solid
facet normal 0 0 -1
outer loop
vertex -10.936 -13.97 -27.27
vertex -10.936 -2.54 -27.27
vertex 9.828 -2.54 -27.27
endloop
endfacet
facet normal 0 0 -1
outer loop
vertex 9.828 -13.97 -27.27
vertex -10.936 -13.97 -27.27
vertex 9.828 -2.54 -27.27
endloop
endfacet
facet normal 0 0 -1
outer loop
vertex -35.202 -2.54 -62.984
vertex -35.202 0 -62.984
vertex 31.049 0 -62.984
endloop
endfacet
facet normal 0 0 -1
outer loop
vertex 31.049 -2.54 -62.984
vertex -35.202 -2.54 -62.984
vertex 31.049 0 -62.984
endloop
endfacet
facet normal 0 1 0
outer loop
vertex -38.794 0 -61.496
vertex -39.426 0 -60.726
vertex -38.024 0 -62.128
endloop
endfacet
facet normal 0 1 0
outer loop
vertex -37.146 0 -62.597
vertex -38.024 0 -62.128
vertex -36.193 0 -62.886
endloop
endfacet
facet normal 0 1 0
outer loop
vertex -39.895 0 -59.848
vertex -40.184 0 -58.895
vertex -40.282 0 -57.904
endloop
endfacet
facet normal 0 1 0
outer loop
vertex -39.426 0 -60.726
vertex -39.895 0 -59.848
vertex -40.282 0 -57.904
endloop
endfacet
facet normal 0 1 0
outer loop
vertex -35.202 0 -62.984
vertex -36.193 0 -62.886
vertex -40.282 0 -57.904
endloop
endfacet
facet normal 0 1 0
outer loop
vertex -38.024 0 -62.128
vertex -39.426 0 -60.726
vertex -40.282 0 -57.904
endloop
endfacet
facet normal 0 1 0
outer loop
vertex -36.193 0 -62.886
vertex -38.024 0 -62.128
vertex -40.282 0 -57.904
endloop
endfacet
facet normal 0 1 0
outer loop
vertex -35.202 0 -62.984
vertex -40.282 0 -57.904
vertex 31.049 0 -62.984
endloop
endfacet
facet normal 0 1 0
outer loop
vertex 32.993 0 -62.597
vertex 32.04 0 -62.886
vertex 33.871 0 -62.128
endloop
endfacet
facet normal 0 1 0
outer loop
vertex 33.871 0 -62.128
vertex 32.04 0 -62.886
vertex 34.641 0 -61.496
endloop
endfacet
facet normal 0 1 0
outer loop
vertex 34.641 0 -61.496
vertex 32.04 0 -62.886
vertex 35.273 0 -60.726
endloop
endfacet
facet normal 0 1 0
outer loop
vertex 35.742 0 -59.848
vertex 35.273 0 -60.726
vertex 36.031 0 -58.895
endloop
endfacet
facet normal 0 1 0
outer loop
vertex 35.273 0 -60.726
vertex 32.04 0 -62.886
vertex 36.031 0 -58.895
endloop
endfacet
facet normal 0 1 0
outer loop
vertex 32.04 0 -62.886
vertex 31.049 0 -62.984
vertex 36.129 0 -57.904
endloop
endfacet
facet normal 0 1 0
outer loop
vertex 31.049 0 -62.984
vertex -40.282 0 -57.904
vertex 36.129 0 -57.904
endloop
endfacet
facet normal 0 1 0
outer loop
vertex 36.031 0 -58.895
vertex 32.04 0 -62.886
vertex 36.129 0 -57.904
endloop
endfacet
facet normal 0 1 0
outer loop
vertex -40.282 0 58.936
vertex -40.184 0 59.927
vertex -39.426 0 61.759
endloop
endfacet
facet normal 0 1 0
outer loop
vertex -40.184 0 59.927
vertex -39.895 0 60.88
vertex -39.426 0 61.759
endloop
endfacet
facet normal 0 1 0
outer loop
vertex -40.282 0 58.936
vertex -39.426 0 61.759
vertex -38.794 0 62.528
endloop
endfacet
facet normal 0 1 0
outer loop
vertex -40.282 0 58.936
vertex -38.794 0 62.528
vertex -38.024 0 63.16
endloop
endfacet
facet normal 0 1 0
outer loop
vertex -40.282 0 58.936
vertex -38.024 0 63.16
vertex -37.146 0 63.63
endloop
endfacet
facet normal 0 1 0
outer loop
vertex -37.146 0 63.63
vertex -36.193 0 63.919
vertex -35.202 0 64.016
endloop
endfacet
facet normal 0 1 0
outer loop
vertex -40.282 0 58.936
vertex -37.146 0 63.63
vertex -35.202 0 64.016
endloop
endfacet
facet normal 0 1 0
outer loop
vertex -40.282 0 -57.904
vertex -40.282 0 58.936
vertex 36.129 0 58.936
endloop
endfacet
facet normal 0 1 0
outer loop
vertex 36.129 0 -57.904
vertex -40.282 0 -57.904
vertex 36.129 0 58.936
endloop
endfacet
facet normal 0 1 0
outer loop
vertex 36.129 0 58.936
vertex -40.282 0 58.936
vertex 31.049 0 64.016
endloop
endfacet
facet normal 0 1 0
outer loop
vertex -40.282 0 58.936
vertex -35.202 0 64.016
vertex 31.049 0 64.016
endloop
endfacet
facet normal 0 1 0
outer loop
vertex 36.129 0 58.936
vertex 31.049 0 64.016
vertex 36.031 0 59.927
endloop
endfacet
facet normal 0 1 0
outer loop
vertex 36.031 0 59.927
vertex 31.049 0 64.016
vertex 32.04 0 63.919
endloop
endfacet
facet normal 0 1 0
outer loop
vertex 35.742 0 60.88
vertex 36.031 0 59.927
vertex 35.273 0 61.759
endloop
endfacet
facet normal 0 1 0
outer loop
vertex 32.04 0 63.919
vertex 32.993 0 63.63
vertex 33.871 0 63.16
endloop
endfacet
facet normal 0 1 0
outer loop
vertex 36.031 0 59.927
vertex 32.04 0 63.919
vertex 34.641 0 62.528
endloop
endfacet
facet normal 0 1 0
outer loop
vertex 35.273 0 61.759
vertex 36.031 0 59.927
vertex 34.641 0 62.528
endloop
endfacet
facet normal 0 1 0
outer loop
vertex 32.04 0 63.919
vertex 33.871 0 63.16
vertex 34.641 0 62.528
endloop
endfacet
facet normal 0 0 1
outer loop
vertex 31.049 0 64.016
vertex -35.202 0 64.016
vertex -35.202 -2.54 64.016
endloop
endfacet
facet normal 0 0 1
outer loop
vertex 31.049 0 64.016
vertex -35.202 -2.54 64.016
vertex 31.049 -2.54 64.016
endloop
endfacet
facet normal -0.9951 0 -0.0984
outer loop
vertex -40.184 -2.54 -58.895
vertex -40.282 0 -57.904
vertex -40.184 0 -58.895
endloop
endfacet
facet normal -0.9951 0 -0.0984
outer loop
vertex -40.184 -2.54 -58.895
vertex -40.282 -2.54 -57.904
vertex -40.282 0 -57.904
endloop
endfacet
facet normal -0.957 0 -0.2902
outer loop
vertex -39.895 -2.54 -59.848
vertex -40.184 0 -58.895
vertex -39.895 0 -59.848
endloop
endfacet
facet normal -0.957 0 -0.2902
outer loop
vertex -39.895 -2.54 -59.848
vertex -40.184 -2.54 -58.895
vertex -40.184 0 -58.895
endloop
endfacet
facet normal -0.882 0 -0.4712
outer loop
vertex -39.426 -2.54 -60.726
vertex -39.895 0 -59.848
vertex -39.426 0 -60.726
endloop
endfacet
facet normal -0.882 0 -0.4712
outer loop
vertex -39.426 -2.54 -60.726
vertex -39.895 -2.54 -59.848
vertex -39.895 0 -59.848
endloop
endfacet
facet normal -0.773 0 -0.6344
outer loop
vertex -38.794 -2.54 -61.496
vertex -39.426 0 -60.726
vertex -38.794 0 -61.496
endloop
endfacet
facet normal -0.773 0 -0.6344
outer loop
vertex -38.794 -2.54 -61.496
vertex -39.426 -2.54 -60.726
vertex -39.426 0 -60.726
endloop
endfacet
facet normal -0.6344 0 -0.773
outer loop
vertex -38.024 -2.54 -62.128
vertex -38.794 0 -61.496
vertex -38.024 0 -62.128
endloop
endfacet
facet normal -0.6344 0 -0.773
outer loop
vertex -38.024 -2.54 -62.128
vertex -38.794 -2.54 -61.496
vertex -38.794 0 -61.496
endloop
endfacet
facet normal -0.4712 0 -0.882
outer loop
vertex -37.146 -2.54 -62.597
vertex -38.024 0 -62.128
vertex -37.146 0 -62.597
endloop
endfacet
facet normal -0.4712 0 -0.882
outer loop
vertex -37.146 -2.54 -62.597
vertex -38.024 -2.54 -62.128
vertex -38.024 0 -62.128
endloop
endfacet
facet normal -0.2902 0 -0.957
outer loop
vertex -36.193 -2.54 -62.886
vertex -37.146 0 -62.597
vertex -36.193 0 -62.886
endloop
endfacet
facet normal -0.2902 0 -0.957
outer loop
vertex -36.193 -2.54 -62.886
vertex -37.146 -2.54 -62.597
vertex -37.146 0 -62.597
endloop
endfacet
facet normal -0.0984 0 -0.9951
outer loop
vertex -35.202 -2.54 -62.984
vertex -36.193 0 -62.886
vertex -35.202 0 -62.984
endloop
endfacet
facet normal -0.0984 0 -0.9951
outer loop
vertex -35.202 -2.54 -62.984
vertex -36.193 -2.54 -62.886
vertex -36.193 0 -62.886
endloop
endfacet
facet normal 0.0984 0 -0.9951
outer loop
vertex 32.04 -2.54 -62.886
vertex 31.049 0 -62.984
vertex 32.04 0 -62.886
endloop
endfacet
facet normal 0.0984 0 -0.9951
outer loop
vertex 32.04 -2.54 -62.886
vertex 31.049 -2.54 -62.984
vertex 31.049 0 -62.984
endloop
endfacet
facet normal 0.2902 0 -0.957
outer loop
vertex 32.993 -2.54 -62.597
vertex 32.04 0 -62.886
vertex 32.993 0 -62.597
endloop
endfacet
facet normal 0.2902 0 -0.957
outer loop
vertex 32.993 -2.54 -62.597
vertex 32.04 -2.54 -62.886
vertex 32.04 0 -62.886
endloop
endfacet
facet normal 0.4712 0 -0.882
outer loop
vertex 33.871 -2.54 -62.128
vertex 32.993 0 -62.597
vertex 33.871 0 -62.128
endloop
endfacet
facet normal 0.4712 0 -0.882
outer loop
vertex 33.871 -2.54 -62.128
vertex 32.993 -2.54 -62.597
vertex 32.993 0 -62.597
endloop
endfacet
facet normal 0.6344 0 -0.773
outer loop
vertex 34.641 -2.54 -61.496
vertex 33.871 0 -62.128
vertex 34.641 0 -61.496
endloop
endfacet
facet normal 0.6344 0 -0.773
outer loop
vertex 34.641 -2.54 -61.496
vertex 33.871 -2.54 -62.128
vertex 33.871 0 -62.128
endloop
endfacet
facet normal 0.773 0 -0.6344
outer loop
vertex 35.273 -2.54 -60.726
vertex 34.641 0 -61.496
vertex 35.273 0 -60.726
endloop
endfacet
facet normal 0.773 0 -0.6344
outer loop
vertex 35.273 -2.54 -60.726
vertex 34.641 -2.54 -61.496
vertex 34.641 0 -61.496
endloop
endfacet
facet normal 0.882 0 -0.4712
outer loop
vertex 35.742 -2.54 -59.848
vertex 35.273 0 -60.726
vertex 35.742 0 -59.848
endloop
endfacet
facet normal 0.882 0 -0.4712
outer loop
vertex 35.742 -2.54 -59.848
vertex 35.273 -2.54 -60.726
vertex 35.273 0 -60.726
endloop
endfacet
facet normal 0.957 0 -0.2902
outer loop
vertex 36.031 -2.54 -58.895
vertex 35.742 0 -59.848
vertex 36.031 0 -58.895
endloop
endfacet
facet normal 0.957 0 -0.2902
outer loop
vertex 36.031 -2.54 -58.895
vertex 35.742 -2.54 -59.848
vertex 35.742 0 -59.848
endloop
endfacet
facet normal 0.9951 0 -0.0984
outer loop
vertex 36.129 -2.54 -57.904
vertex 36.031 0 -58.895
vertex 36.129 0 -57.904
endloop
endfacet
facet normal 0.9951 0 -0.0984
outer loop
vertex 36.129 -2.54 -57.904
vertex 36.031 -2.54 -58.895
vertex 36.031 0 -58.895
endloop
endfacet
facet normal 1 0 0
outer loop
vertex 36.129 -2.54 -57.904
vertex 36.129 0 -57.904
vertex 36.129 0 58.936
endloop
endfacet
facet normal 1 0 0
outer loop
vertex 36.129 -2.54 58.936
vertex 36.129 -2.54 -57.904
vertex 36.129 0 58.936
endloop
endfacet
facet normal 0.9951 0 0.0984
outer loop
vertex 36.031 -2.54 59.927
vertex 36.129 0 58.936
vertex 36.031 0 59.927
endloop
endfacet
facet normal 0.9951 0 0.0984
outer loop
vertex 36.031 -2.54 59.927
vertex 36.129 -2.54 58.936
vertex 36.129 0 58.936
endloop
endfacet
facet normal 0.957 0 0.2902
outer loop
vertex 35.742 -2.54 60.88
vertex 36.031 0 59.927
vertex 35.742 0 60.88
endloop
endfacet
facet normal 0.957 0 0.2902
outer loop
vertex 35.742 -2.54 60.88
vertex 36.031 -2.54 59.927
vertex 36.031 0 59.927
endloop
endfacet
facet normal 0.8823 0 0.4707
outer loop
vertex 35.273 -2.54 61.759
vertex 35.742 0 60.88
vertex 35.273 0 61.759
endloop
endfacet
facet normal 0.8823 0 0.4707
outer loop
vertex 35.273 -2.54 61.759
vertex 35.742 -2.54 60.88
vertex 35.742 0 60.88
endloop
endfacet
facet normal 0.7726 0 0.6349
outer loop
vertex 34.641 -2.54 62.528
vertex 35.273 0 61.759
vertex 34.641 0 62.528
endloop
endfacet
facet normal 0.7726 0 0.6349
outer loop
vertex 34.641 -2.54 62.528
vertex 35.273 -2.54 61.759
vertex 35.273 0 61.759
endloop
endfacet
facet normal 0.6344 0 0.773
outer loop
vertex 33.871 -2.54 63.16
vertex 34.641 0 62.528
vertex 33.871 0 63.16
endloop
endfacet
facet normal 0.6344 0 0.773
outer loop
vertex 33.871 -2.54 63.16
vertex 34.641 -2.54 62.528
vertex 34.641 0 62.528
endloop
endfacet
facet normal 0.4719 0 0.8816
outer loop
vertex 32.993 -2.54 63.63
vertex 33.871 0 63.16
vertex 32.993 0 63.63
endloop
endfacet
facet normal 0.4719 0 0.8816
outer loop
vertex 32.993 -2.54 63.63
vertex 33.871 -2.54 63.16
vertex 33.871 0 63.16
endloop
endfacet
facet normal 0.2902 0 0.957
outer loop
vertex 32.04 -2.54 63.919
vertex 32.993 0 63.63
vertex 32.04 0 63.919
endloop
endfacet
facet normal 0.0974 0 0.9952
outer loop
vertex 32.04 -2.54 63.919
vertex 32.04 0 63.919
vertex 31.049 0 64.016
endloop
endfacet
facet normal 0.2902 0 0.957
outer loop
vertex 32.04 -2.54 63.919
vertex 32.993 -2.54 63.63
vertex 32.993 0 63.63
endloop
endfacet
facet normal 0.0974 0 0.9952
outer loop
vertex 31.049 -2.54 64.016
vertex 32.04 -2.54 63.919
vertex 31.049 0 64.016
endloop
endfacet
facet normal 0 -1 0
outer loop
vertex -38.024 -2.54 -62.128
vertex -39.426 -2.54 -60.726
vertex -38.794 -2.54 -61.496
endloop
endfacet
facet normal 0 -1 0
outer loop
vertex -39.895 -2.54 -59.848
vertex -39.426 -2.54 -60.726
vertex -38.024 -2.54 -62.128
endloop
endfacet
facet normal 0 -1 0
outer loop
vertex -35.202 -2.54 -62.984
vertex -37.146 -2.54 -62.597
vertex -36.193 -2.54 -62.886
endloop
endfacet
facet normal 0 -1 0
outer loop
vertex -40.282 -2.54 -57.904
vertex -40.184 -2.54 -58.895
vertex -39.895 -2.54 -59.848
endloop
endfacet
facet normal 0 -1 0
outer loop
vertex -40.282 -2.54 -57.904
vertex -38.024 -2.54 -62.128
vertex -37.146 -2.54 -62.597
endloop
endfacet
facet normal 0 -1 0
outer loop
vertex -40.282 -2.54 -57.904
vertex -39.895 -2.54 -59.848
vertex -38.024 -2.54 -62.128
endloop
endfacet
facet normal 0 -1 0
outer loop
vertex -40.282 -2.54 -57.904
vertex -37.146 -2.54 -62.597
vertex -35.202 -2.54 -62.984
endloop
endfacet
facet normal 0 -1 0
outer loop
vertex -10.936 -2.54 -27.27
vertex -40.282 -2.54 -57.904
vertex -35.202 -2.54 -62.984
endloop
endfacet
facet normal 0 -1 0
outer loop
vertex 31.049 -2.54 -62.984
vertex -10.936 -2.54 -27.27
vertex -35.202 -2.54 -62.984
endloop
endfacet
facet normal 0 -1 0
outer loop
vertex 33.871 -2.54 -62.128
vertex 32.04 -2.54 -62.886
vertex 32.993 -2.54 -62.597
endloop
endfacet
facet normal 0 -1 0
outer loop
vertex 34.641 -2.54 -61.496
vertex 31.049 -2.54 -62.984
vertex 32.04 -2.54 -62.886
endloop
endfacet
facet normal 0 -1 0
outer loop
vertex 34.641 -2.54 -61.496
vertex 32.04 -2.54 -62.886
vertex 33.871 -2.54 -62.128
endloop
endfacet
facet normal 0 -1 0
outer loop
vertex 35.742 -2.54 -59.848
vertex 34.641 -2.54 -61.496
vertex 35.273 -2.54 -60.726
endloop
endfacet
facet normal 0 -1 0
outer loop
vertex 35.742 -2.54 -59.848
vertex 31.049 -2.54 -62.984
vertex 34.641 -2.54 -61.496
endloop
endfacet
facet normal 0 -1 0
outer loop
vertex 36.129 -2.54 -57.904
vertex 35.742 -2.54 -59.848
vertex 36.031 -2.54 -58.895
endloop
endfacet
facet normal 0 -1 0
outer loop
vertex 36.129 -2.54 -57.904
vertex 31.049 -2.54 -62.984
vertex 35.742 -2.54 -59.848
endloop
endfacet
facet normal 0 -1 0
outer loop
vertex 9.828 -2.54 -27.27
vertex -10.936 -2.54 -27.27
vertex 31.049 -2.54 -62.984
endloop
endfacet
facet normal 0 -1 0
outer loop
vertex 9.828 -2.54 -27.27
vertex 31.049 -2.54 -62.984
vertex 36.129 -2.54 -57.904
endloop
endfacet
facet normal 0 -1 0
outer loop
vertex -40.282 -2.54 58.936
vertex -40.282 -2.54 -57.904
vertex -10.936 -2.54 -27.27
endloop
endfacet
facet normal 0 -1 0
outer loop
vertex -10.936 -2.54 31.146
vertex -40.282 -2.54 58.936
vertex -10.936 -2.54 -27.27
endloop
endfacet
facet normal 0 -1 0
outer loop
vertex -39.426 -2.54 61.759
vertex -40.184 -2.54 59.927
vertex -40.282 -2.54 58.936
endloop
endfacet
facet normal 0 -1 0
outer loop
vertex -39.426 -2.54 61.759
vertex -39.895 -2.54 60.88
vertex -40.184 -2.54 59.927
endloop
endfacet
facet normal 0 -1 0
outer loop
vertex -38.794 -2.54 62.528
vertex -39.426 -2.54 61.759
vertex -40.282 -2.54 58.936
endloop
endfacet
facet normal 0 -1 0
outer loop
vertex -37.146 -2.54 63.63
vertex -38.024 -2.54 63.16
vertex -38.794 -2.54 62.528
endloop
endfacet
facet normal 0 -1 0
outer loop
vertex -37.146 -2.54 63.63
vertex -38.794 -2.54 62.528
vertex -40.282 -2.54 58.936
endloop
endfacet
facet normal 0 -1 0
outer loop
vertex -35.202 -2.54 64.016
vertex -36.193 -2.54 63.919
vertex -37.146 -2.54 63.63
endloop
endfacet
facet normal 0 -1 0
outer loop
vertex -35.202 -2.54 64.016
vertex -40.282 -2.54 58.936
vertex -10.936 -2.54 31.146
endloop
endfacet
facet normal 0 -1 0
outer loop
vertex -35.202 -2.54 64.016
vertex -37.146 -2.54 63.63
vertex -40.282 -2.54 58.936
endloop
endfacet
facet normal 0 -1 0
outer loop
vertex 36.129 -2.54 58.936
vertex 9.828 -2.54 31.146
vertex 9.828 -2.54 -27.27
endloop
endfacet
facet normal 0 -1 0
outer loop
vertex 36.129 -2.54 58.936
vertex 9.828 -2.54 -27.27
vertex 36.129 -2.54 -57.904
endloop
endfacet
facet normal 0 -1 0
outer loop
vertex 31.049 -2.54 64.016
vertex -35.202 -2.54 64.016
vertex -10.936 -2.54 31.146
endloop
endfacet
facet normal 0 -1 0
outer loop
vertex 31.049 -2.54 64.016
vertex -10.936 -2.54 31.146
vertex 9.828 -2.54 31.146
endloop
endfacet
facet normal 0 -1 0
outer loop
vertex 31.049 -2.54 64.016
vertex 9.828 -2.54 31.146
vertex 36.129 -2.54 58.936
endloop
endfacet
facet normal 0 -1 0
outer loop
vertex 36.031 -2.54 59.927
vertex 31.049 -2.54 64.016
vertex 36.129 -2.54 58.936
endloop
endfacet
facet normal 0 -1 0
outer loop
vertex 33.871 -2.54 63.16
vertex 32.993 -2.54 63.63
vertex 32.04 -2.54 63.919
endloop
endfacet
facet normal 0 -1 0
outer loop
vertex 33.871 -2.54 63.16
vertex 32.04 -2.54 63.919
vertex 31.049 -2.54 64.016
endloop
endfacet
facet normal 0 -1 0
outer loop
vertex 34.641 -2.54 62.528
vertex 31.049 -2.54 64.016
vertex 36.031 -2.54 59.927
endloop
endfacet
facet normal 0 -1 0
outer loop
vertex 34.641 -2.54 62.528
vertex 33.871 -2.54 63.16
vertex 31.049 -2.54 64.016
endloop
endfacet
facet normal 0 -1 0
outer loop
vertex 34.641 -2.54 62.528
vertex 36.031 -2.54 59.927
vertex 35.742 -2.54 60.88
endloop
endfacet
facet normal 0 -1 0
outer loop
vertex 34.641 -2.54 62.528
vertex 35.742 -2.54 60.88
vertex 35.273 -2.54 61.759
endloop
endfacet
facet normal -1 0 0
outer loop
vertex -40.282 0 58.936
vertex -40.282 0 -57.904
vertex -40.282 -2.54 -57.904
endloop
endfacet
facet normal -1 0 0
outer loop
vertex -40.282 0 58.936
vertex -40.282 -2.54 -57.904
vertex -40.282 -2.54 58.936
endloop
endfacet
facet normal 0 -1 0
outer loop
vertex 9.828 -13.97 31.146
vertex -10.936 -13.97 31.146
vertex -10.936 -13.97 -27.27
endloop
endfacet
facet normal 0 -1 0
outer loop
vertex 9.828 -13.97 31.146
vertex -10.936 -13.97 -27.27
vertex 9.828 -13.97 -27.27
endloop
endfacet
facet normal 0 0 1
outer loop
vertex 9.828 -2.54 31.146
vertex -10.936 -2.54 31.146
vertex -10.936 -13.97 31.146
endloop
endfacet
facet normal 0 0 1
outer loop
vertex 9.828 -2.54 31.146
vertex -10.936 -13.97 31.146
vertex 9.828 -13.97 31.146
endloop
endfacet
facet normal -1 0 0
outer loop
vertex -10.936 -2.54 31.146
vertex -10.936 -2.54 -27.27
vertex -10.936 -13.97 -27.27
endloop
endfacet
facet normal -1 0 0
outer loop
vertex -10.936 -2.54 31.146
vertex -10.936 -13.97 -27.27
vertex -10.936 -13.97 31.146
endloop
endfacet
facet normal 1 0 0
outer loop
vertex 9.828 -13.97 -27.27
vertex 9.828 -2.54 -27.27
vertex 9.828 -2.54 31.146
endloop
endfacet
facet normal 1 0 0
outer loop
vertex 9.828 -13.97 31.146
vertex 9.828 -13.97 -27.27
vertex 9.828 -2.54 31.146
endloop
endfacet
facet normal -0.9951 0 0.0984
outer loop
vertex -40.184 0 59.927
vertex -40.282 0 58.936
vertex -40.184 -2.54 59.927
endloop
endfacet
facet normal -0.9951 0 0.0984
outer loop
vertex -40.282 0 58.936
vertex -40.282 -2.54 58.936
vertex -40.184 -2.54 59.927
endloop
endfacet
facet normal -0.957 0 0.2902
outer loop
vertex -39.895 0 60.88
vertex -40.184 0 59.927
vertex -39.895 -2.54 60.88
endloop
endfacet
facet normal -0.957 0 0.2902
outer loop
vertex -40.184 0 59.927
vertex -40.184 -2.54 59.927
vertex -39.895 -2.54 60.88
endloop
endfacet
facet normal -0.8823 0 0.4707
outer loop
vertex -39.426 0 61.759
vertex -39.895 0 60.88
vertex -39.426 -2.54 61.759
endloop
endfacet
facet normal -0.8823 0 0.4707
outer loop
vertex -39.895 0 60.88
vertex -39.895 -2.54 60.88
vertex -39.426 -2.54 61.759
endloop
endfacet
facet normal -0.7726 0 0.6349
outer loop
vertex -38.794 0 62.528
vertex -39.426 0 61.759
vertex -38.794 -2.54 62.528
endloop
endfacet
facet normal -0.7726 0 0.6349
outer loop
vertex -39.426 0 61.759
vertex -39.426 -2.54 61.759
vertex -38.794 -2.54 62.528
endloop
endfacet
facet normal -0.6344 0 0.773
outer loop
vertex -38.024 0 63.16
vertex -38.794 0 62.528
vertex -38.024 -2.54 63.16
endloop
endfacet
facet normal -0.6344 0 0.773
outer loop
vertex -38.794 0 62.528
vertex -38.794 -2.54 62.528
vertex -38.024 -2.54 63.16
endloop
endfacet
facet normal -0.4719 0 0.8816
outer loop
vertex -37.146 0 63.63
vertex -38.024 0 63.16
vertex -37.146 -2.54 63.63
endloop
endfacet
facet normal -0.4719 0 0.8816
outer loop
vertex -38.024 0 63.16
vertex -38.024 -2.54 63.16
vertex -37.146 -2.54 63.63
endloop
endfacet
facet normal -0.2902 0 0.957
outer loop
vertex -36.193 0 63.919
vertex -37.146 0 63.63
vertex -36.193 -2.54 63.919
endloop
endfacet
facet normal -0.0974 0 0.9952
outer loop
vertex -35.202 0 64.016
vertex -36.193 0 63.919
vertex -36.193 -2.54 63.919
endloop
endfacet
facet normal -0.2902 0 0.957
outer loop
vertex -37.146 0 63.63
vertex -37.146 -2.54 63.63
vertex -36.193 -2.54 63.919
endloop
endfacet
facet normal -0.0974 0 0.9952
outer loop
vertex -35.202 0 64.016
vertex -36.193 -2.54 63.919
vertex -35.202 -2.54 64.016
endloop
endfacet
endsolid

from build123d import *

# Parameters (mm, degrees)
F0_W     = 76.410934
F0_H     = 127
F1_DEPTH = 2.54
F2_R     = 5.08
F3_W     = 20.763844
F3_H     = 58.415605
F4_DEPTH = 13.97


with BuildPart() as f1:
    # F0 (on Front) → F1 (new body)
    with BuildSketch(Plane.XZ):
        with Locations((-2.076384, 0.516346)):
            Rectangle(F0_W, F0_H)
    extrude(amount=F1_DEPTH)

    # F2
    f2_edges = [f1.edges().sort_by_distance(p)[0] for p in [
        (-40.281851, -1.27, 64.016346),
        (36.129083, -1.27, 64.016346),
        (36.129083, -1.27, -62.983654),
        (-40.281851, -1.27, -62.983654),
    ]]
    fillet(f2_edges, radius=F2_R)

    # F3 (on Front) → F4 (join)
    with BuildSketch(Plane.XZ):
        with Locations((-0.553702, 1.937959)):
            Rectangle(F3_W, F3_H)
    extrude(amount=F4_DEPTH)


solid = f1.part
